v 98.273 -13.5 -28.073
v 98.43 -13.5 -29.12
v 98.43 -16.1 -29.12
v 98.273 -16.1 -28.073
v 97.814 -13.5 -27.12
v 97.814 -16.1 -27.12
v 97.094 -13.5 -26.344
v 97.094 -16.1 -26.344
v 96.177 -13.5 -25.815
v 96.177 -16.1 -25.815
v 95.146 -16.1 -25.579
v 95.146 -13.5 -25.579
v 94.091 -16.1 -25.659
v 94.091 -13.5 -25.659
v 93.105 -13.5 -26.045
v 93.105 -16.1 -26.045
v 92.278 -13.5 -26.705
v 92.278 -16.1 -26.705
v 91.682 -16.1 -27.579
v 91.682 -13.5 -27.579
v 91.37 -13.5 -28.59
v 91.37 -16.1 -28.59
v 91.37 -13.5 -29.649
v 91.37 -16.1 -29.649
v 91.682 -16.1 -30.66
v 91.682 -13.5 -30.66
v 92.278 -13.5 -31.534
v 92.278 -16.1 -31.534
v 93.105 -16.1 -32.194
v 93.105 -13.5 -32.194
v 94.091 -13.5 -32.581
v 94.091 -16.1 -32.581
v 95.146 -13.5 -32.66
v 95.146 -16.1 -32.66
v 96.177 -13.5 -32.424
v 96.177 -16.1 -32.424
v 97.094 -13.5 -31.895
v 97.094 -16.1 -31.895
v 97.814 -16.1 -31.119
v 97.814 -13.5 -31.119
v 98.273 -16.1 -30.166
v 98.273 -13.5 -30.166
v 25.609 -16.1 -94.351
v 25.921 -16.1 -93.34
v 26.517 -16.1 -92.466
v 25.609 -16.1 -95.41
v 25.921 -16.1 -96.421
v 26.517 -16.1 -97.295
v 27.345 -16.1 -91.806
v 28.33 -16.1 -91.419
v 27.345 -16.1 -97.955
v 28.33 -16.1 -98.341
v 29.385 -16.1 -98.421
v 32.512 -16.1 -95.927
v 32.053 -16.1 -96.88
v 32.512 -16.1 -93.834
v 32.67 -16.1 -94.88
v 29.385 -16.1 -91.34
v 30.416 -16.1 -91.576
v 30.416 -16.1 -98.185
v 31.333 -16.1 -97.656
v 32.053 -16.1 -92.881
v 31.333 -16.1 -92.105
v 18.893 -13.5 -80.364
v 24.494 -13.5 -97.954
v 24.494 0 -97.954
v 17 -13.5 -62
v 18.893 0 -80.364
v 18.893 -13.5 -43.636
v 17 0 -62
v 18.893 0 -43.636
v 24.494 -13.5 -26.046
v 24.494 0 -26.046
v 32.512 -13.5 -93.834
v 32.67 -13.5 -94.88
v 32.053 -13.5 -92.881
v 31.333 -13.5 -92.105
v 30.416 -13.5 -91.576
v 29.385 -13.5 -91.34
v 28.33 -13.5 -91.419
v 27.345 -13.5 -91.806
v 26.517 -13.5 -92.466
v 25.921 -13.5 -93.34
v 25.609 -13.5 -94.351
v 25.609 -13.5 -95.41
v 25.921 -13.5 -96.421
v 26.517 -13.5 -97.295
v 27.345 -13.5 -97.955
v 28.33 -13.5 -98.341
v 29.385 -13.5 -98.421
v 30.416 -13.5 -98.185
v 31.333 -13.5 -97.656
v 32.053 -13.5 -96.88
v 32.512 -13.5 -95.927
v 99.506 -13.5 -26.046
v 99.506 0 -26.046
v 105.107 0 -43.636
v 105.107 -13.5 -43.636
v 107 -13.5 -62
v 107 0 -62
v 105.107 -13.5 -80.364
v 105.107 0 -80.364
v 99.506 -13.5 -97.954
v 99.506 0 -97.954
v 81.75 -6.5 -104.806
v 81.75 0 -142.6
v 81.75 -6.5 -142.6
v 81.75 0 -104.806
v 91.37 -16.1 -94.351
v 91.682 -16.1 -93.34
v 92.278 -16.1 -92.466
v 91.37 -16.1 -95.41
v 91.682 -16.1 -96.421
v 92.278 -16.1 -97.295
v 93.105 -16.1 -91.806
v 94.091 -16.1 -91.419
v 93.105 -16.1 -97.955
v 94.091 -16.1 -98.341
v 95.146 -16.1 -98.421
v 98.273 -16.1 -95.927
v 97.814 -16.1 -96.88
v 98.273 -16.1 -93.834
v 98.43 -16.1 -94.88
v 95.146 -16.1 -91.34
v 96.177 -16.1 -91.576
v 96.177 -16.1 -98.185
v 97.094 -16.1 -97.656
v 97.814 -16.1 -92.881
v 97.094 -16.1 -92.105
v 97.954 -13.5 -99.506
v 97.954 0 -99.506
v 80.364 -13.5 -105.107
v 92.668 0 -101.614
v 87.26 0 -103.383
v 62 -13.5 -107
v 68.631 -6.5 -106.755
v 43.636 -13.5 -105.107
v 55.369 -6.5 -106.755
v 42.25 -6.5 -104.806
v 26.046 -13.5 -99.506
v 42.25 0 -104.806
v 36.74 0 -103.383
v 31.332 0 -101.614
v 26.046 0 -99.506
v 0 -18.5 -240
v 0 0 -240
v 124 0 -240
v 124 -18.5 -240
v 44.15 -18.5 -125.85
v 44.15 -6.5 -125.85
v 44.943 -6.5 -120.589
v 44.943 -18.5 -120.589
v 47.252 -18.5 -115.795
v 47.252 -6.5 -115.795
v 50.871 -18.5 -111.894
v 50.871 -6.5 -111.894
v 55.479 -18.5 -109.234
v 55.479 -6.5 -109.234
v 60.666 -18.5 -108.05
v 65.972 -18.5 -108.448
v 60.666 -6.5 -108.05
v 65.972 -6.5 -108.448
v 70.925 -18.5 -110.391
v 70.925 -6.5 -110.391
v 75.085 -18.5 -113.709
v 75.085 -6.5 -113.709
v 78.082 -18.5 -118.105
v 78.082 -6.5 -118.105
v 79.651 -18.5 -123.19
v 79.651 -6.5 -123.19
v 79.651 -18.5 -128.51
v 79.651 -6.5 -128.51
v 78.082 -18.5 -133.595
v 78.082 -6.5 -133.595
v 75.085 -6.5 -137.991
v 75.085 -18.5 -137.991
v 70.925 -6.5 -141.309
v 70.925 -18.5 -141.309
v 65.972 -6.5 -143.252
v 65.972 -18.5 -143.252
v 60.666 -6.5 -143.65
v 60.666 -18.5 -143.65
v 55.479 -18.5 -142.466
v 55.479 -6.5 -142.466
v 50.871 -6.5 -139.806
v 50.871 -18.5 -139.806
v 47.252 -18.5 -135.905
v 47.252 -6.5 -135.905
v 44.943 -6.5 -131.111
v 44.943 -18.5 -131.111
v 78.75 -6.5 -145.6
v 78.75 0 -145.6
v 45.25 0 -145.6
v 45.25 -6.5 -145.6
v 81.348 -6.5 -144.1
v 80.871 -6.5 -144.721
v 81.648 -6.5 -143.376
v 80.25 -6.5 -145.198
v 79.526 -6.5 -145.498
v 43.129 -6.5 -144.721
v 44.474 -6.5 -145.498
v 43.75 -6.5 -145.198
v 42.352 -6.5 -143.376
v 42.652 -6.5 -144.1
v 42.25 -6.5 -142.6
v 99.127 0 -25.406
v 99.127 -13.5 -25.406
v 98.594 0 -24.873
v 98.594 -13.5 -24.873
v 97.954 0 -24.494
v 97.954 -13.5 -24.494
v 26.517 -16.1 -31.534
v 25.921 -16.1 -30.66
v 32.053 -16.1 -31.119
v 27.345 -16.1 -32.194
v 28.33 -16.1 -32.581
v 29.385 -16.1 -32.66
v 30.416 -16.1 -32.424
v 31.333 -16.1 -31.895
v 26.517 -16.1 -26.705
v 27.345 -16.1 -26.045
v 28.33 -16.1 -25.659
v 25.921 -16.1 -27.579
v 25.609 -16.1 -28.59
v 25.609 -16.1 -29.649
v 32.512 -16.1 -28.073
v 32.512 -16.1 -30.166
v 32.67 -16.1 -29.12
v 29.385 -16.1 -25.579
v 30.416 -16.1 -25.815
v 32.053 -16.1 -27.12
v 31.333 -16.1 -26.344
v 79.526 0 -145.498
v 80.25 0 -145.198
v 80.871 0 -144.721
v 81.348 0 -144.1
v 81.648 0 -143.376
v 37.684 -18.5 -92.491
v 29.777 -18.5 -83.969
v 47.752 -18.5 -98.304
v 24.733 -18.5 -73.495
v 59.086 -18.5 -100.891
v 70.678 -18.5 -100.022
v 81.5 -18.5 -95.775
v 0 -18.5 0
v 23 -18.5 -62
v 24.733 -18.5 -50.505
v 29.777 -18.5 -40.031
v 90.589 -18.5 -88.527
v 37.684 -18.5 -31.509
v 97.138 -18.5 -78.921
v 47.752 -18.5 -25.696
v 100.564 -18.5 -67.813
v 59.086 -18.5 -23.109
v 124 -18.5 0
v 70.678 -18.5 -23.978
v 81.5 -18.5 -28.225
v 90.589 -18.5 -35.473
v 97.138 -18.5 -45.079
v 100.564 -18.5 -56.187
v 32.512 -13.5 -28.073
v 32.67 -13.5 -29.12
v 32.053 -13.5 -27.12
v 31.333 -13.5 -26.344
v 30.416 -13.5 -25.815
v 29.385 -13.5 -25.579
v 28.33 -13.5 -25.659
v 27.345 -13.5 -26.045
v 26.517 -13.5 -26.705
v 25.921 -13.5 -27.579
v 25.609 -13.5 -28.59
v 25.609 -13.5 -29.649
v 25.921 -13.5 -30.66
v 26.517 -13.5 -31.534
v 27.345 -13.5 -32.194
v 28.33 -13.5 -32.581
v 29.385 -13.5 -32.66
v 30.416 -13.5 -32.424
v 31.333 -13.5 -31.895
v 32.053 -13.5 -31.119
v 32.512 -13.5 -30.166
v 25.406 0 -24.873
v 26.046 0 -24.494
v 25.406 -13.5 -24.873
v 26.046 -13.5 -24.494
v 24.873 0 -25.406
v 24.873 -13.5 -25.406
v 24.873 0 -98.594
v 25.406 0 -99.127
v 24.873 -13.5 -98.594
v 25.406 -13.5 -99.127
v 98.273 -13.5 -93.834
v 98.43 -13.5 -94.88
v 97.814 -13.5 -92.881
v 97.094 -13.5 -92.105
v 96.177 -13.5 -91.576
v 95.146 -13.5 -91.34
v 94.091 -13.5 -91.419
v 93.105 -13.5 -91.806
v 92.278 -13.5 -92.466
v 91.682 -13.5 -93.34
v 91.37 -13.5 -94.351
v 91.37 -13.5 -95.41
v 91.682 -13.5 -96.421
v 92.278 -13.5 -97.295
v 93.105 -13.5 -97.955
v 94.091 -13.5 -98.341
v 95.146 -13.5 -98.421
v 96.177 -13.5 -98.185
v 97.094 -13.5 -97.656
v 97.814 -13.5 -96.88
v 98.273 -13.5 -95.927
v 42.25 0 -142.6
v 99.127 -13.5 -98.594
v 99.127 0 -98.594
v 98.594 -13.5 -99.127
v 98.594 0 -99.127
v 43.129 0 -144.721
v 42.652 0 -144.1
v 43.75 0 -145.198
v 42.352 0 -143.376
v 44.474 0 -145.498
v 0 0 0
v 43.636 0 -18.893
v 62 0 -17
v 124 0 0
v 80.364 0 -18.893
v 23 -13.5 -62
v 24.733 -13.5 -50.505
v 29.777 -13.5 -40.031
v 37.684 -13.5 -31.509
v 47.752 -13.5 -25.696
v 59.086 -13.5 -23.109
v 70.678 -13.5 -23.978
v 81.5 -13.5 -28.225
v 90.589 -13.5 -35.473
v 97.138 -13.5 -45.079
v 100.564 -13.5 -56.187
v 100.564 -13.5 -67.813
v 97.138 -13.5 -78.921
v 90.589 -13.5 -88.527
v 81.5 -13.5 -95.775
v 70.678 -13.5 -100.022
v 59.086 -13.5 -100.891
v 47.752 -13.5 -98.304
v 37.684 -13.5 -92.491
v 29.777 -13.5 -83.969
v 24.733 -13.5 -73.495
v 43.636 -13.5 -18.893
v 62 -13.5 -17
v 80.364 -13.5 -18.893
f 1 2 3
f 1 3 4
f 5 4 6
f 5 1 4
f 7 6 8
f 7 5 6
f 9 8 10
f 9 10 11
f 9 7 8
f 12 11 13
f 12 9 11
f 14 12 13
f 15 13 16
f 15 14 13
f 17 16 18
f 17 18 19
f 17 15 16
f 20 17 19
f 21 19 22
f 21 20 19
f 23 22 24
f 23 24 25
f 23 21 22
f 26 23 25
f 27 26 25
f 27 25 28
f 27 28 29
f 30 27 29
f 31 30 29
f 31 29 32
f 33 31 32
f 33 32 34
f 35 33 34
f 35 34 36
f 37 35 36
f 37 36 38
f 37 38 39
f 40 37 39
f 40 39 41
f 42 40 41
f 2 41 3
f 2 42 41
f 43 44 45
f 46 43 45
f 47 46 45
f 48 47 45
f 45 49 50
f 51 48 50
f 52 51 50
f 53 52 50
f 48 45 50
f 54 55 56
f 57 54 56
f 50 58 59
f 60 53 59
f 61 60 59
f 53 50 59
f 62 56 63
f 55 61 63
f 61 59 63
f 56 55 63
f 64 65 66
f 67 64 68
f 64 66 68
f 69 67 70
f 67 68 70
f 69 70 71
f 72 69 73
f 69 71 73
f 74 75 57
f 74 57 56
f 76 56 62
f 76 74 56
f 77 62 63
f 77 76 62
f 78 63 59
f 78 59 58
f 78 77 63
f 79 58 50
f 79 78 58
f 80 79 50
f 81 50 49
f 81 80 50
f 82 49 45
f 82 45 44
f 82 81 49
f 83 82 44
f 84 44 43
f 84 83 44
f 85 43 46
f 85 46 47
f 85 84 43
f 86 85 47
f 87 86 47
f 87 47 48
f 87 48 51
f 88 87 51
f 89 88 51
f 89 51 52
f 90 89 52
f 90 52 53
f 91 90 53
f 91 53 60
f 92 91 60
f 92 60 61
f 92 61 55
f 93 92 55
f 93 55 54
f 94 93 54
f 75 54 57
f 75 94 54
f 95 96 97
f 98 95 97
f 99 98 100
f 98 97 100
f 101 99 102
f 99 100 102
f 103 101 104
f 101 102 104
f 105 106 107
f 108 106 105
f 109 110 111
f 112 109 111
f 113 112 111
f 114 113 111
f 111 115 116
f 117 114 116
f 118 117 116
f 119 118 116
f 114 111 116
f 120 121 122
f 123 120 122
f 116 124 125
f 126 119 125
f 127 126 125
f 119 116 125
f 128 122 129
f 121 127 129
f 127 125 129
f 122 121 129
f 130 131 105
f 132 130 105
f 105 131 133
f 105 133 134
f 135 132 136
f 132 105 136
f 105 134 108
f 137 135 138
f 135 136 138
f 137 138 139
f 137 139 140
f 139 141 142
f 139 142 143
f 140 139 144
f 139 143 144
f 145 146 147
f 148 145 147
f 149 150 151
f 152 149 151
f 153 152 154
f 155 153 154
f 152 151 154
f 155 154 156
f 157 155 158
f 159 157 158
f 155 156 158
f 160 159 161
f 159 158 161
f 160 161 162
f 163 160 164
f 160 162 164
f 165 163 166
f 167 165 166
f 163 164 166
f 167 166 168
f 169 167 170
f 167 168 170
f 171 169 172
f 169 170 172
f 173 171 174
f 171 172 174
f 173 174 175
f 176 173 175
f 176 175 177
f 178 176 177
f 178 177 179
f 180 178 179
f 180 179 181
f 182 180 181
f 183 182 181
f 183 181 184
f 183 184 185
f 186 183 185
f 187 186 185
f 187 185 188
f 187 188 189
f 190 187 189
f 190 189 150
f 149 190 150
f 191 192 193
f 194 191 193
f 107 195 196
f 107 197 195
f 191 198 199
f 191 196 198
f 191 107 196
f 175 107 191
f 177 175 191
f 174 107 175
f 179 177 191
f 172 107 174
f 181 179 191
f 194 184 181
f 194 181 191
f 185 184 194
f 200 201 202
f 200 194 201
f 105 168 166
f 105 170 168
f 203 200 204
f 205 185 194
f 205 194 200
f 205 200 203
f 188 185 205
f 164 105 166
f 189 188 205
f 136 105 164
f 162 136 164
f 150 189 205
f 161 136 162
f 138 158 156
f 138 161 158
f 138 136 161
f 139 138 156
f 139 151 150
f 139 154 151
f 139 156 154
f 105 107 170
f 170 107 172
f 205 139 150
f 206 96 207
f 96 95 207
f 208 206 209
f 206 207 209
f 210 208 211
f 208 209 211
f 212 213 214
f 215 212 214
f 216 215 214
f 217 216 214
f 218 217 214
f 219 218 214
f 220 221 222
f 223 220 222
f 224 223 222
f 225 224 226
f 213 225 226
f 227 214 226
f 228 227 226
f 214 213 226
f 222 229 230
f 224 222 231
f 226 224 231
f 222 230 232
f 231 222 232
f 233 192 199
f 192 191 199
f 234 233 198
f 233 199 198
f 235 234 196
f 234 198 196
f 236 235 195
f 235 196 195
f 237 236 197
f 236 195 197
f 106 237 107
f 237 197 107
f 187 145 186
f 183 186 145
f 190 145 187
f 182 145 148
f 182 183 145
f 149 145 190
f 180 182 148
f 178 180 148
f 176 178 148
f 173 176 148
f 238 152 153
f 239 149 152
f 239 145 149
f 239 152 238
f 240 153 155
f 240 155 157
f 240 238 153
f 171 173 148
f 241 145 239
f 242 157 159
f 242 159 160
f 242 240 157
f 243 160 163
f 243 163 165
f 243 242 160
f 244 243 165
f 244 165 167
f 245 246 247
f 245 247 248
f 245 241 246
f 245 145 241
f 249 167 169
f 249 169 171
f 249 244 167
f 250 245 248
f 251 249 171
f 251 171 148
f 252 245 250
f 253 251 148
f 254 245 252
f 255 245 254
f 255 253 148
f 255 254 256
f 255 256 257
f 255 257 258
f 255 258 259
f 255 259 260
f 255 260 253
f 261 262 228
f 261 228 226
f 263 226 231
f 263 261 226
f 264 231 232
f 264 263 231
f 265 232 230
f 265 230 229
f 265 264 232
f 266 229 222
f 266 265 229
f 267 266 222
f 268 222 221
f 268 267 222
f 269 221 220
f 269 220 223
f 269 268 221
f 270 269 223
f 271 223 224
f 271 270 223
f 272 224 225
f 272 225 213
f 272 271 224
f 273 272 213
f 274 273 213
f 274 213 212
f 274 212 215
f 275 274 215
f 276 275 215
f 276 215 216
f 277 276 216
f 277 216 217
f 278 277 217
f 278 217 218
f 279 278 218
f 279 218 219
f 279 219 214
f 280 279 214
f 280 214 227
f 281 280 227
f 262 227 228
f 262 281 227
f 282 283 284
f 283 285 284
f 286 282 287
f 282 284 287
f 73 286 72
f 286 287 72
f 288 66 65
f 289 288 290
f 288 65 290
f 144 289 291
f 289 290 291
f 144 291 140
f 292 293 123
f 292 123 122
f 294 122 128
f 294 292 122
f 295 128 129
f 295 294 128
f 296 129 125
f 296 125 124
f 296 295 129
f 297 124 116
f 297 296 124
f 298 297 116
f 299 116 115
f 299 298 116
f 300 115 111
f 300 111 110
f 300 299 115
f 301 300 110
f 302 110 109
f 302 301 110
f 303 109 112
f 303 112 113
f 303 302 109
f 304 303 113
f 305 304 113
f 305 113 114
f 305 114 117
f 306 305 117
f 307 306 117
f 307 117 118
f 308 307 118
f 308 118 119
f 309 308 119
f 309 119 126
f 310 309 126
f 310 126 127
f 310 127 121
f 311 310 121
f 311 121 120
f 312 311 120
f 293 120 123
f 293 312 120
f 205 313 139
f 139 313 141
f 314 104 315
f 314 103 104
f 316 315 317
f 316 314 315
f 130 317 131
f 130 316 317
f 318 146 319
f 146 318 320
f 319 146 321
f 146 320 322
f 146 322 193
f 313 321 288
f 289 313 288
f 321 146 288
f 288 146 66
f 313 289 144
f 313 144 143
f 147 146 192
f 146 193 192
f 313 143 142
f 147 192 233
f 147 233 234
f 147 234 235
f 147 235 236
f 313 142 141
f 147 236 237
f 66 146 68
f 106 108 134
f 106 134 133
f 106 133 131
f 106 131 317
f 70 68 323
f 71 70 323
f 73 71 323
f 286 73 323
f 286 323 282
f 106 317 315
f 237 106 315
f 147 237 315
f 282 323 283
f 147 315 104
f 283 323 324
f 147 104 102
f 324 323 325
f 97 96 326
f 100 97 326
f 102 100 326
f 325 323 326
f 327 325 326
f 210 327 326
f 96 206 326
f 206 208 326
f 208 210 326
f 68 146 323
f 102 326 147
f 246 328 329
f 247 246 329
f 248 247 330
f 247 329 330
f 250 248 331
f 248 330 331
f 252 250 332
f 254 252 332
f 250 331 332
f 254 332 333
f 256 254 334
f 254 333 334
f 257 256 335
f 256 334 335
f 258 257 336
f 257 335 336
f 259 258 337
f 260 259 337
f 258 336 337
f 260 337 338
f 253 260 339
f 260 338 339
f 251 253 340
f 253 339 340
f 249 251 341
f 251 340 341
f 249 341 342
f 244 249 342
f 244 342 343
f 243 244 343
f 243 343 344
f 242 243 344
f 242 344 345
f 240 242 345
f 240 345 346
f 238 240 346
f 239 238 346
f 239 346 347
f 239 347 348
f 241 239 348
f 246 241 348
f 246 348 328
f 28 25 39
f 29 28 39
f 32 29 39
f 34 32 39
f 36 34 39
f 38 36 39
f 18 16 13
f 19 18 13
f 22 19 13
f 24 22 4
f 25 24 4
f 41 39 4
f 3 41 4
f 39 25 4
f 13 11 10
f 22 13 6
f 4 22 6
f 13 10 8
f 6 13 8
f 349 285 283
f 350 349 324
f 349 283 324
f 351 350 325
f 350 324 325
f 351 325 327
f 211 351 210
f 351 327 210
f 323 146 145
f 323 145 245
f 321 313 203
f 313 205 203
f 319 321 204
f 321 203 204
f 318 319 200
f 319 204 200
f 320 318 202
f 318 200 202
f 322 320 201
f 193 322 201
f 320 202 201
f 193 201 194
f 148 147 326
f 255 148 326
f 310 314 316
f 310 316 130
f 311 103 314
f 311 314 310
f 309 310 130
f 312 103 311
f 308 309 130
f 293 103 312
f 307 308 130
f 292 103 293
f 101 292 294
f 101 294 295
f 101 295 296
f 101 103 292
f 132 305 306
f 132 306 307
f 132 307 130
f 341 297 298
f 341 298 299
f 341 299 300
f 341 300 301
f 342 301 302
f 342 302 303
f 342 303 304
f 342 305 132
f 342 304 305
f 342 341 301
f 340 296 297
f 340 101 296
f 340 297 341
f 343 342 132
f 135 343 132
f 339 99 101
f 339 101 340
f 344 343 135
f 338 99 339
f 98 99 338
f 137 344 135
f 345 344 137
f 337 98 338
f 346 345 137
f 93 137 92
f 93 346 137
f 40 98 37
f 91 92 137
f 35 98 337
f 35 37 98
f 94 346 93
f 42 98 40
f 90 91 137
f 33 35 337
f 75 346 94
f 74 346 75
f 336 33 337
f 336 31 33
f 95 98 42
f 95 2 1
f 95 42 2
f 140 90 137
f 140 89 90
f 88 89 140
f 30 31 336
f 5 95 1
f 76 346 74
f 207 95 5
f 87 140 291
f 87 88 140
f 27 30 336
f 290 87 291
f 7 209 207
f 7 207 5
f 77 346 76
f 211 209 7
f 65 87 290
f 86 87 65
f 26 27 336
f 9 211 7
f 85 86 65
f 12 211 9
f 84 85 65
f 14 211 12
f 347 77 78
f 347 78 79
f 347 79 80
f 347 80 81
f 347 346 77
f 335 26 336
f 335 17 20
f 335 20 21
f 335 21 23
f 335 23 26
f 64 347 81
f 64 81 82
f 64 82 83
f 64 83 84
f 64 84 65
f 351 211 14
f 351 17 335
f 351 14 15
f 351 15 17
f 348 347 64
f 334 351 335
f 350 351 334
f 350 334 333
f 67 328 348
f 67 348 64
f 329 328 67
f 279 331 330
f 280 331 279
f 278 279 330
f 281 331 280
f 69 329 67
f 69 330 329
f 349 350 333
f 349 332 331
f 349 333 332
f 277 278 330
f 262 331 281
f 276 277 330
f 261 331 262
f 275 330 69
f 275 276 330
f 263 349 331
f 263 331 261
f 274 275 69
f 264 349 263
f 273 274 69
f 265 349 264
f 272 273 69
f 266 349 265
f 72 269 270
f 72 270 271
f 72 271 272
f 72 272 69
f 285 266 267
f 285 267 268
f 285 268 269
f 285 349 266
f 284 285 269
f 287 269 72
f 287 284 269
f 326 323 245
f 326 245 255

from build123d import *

# Parameters (mm, degrees)
F0_W      = 124
F0_H      = 240
F1_DEPTH  = 18.5
F2_R      = 39
F2_R_2    = 17.85
F3_DEPTH  = 18.501
F5_DEPTH  = 13.5
F7_R      = 3.55
F8_DEPTH  = 2.6
F9_W      = 39.5
F9_H      = 42.75
F10_DEPTH = 6.5
F11_R     = 3


with BuildPart() as f1:
    # F0 (on Front) → F1 (new body)
    with BuildSketch(Plane.XZ):
        with Locations((62, -120)):
            Rectangle(F0_W, F0_H)
    extrude(amount=F1_DEPTH)

    # F2 (on face) → F3 (cut, through all)
    with BuildSketch(Plane(origin=(0, 0, 0), x_dir=(-1, 0, 0), z_dir=(0, 1, 0))):
        with Locations((-62, -62)):
            Circle(F2_R)
        with Locations((-62, -125.85)):
            Circle(F2_R_2)
    extrude(amount=-F3_DEPTH, mode=Mode.SUBTRACT)

    # F4 (on face) → F5 (cut)
    with BuildSketch(Plane(origin=(0, 0, 0), x_dir=(-1, 0, 0), z_dir=(0, 1, 0))):
        with BuildLine():
            ThreePointArc((-24.970595501, -99.029404499), (-17, -62), (-24.970595501, -24.970595501))
            ThreePointArc((-24.970595501, -24.970595501), (-62, -17), (-99.029404499, -24.970595501))
            ThreePointArc((-99.029404499, -24.970595501), (-107, -62), (-99.029404499, -99.029404499))
            ThreePointArc((-99.029404499, -99.029404499), (-62, -107), (-24.970595501, -99.029404499))
        make_face()
    extrude(amount=-F5_DEPTH, mode=Mode.SUBTRACT)

    # F7 (on offset) → F8 (cut)
    with BuildSketch(Plane.XZ.offset(13.5)):
        with Locations((29.1195346748, -29.1195346748)):
            Circle(F7_R)
        with Locations((29.1195346748, -94.8804653252)):
            Circle(F7_R)
        with Locations((94.8804653252, -94.8804653252)):
            Circle(F7_R)
        with Locations((94.8804653252, -29.1195346748)):
            Circle(F7_R)
    extrude(amount=F8_DEPTH, mode=Mode.SUBTRACT)

    # F9 (on face) → F10 (cut)
    with BuildSketch(Plane(origin=(0, 0, 0), x_dir=(-1, 0, 0), z_dir=(0, 1, 0))):
        with Locations((-62, -124.225)):
            Rectangle(F9_W, F9_H)
    extrude(amount=-F10_DEPTH, mode=Mode.SUBTRACT)

    # F11
    f11_edges = [f1.edges().sort_by_distance(p)[0] for p in [
        (81.75, -3.25, -145.6),
        (42.25, -3.25, -145.6),
        (99.029404, -6.75, -99.029404),
        (24.970596, -6.75, -99.029404),
        (24.970596, -6.75, -24.970596),
        (99.029404, -6.75, -24.970596),
    ]]
    fillet(f11_edges, radius=F11_R)


solid = f1.part
